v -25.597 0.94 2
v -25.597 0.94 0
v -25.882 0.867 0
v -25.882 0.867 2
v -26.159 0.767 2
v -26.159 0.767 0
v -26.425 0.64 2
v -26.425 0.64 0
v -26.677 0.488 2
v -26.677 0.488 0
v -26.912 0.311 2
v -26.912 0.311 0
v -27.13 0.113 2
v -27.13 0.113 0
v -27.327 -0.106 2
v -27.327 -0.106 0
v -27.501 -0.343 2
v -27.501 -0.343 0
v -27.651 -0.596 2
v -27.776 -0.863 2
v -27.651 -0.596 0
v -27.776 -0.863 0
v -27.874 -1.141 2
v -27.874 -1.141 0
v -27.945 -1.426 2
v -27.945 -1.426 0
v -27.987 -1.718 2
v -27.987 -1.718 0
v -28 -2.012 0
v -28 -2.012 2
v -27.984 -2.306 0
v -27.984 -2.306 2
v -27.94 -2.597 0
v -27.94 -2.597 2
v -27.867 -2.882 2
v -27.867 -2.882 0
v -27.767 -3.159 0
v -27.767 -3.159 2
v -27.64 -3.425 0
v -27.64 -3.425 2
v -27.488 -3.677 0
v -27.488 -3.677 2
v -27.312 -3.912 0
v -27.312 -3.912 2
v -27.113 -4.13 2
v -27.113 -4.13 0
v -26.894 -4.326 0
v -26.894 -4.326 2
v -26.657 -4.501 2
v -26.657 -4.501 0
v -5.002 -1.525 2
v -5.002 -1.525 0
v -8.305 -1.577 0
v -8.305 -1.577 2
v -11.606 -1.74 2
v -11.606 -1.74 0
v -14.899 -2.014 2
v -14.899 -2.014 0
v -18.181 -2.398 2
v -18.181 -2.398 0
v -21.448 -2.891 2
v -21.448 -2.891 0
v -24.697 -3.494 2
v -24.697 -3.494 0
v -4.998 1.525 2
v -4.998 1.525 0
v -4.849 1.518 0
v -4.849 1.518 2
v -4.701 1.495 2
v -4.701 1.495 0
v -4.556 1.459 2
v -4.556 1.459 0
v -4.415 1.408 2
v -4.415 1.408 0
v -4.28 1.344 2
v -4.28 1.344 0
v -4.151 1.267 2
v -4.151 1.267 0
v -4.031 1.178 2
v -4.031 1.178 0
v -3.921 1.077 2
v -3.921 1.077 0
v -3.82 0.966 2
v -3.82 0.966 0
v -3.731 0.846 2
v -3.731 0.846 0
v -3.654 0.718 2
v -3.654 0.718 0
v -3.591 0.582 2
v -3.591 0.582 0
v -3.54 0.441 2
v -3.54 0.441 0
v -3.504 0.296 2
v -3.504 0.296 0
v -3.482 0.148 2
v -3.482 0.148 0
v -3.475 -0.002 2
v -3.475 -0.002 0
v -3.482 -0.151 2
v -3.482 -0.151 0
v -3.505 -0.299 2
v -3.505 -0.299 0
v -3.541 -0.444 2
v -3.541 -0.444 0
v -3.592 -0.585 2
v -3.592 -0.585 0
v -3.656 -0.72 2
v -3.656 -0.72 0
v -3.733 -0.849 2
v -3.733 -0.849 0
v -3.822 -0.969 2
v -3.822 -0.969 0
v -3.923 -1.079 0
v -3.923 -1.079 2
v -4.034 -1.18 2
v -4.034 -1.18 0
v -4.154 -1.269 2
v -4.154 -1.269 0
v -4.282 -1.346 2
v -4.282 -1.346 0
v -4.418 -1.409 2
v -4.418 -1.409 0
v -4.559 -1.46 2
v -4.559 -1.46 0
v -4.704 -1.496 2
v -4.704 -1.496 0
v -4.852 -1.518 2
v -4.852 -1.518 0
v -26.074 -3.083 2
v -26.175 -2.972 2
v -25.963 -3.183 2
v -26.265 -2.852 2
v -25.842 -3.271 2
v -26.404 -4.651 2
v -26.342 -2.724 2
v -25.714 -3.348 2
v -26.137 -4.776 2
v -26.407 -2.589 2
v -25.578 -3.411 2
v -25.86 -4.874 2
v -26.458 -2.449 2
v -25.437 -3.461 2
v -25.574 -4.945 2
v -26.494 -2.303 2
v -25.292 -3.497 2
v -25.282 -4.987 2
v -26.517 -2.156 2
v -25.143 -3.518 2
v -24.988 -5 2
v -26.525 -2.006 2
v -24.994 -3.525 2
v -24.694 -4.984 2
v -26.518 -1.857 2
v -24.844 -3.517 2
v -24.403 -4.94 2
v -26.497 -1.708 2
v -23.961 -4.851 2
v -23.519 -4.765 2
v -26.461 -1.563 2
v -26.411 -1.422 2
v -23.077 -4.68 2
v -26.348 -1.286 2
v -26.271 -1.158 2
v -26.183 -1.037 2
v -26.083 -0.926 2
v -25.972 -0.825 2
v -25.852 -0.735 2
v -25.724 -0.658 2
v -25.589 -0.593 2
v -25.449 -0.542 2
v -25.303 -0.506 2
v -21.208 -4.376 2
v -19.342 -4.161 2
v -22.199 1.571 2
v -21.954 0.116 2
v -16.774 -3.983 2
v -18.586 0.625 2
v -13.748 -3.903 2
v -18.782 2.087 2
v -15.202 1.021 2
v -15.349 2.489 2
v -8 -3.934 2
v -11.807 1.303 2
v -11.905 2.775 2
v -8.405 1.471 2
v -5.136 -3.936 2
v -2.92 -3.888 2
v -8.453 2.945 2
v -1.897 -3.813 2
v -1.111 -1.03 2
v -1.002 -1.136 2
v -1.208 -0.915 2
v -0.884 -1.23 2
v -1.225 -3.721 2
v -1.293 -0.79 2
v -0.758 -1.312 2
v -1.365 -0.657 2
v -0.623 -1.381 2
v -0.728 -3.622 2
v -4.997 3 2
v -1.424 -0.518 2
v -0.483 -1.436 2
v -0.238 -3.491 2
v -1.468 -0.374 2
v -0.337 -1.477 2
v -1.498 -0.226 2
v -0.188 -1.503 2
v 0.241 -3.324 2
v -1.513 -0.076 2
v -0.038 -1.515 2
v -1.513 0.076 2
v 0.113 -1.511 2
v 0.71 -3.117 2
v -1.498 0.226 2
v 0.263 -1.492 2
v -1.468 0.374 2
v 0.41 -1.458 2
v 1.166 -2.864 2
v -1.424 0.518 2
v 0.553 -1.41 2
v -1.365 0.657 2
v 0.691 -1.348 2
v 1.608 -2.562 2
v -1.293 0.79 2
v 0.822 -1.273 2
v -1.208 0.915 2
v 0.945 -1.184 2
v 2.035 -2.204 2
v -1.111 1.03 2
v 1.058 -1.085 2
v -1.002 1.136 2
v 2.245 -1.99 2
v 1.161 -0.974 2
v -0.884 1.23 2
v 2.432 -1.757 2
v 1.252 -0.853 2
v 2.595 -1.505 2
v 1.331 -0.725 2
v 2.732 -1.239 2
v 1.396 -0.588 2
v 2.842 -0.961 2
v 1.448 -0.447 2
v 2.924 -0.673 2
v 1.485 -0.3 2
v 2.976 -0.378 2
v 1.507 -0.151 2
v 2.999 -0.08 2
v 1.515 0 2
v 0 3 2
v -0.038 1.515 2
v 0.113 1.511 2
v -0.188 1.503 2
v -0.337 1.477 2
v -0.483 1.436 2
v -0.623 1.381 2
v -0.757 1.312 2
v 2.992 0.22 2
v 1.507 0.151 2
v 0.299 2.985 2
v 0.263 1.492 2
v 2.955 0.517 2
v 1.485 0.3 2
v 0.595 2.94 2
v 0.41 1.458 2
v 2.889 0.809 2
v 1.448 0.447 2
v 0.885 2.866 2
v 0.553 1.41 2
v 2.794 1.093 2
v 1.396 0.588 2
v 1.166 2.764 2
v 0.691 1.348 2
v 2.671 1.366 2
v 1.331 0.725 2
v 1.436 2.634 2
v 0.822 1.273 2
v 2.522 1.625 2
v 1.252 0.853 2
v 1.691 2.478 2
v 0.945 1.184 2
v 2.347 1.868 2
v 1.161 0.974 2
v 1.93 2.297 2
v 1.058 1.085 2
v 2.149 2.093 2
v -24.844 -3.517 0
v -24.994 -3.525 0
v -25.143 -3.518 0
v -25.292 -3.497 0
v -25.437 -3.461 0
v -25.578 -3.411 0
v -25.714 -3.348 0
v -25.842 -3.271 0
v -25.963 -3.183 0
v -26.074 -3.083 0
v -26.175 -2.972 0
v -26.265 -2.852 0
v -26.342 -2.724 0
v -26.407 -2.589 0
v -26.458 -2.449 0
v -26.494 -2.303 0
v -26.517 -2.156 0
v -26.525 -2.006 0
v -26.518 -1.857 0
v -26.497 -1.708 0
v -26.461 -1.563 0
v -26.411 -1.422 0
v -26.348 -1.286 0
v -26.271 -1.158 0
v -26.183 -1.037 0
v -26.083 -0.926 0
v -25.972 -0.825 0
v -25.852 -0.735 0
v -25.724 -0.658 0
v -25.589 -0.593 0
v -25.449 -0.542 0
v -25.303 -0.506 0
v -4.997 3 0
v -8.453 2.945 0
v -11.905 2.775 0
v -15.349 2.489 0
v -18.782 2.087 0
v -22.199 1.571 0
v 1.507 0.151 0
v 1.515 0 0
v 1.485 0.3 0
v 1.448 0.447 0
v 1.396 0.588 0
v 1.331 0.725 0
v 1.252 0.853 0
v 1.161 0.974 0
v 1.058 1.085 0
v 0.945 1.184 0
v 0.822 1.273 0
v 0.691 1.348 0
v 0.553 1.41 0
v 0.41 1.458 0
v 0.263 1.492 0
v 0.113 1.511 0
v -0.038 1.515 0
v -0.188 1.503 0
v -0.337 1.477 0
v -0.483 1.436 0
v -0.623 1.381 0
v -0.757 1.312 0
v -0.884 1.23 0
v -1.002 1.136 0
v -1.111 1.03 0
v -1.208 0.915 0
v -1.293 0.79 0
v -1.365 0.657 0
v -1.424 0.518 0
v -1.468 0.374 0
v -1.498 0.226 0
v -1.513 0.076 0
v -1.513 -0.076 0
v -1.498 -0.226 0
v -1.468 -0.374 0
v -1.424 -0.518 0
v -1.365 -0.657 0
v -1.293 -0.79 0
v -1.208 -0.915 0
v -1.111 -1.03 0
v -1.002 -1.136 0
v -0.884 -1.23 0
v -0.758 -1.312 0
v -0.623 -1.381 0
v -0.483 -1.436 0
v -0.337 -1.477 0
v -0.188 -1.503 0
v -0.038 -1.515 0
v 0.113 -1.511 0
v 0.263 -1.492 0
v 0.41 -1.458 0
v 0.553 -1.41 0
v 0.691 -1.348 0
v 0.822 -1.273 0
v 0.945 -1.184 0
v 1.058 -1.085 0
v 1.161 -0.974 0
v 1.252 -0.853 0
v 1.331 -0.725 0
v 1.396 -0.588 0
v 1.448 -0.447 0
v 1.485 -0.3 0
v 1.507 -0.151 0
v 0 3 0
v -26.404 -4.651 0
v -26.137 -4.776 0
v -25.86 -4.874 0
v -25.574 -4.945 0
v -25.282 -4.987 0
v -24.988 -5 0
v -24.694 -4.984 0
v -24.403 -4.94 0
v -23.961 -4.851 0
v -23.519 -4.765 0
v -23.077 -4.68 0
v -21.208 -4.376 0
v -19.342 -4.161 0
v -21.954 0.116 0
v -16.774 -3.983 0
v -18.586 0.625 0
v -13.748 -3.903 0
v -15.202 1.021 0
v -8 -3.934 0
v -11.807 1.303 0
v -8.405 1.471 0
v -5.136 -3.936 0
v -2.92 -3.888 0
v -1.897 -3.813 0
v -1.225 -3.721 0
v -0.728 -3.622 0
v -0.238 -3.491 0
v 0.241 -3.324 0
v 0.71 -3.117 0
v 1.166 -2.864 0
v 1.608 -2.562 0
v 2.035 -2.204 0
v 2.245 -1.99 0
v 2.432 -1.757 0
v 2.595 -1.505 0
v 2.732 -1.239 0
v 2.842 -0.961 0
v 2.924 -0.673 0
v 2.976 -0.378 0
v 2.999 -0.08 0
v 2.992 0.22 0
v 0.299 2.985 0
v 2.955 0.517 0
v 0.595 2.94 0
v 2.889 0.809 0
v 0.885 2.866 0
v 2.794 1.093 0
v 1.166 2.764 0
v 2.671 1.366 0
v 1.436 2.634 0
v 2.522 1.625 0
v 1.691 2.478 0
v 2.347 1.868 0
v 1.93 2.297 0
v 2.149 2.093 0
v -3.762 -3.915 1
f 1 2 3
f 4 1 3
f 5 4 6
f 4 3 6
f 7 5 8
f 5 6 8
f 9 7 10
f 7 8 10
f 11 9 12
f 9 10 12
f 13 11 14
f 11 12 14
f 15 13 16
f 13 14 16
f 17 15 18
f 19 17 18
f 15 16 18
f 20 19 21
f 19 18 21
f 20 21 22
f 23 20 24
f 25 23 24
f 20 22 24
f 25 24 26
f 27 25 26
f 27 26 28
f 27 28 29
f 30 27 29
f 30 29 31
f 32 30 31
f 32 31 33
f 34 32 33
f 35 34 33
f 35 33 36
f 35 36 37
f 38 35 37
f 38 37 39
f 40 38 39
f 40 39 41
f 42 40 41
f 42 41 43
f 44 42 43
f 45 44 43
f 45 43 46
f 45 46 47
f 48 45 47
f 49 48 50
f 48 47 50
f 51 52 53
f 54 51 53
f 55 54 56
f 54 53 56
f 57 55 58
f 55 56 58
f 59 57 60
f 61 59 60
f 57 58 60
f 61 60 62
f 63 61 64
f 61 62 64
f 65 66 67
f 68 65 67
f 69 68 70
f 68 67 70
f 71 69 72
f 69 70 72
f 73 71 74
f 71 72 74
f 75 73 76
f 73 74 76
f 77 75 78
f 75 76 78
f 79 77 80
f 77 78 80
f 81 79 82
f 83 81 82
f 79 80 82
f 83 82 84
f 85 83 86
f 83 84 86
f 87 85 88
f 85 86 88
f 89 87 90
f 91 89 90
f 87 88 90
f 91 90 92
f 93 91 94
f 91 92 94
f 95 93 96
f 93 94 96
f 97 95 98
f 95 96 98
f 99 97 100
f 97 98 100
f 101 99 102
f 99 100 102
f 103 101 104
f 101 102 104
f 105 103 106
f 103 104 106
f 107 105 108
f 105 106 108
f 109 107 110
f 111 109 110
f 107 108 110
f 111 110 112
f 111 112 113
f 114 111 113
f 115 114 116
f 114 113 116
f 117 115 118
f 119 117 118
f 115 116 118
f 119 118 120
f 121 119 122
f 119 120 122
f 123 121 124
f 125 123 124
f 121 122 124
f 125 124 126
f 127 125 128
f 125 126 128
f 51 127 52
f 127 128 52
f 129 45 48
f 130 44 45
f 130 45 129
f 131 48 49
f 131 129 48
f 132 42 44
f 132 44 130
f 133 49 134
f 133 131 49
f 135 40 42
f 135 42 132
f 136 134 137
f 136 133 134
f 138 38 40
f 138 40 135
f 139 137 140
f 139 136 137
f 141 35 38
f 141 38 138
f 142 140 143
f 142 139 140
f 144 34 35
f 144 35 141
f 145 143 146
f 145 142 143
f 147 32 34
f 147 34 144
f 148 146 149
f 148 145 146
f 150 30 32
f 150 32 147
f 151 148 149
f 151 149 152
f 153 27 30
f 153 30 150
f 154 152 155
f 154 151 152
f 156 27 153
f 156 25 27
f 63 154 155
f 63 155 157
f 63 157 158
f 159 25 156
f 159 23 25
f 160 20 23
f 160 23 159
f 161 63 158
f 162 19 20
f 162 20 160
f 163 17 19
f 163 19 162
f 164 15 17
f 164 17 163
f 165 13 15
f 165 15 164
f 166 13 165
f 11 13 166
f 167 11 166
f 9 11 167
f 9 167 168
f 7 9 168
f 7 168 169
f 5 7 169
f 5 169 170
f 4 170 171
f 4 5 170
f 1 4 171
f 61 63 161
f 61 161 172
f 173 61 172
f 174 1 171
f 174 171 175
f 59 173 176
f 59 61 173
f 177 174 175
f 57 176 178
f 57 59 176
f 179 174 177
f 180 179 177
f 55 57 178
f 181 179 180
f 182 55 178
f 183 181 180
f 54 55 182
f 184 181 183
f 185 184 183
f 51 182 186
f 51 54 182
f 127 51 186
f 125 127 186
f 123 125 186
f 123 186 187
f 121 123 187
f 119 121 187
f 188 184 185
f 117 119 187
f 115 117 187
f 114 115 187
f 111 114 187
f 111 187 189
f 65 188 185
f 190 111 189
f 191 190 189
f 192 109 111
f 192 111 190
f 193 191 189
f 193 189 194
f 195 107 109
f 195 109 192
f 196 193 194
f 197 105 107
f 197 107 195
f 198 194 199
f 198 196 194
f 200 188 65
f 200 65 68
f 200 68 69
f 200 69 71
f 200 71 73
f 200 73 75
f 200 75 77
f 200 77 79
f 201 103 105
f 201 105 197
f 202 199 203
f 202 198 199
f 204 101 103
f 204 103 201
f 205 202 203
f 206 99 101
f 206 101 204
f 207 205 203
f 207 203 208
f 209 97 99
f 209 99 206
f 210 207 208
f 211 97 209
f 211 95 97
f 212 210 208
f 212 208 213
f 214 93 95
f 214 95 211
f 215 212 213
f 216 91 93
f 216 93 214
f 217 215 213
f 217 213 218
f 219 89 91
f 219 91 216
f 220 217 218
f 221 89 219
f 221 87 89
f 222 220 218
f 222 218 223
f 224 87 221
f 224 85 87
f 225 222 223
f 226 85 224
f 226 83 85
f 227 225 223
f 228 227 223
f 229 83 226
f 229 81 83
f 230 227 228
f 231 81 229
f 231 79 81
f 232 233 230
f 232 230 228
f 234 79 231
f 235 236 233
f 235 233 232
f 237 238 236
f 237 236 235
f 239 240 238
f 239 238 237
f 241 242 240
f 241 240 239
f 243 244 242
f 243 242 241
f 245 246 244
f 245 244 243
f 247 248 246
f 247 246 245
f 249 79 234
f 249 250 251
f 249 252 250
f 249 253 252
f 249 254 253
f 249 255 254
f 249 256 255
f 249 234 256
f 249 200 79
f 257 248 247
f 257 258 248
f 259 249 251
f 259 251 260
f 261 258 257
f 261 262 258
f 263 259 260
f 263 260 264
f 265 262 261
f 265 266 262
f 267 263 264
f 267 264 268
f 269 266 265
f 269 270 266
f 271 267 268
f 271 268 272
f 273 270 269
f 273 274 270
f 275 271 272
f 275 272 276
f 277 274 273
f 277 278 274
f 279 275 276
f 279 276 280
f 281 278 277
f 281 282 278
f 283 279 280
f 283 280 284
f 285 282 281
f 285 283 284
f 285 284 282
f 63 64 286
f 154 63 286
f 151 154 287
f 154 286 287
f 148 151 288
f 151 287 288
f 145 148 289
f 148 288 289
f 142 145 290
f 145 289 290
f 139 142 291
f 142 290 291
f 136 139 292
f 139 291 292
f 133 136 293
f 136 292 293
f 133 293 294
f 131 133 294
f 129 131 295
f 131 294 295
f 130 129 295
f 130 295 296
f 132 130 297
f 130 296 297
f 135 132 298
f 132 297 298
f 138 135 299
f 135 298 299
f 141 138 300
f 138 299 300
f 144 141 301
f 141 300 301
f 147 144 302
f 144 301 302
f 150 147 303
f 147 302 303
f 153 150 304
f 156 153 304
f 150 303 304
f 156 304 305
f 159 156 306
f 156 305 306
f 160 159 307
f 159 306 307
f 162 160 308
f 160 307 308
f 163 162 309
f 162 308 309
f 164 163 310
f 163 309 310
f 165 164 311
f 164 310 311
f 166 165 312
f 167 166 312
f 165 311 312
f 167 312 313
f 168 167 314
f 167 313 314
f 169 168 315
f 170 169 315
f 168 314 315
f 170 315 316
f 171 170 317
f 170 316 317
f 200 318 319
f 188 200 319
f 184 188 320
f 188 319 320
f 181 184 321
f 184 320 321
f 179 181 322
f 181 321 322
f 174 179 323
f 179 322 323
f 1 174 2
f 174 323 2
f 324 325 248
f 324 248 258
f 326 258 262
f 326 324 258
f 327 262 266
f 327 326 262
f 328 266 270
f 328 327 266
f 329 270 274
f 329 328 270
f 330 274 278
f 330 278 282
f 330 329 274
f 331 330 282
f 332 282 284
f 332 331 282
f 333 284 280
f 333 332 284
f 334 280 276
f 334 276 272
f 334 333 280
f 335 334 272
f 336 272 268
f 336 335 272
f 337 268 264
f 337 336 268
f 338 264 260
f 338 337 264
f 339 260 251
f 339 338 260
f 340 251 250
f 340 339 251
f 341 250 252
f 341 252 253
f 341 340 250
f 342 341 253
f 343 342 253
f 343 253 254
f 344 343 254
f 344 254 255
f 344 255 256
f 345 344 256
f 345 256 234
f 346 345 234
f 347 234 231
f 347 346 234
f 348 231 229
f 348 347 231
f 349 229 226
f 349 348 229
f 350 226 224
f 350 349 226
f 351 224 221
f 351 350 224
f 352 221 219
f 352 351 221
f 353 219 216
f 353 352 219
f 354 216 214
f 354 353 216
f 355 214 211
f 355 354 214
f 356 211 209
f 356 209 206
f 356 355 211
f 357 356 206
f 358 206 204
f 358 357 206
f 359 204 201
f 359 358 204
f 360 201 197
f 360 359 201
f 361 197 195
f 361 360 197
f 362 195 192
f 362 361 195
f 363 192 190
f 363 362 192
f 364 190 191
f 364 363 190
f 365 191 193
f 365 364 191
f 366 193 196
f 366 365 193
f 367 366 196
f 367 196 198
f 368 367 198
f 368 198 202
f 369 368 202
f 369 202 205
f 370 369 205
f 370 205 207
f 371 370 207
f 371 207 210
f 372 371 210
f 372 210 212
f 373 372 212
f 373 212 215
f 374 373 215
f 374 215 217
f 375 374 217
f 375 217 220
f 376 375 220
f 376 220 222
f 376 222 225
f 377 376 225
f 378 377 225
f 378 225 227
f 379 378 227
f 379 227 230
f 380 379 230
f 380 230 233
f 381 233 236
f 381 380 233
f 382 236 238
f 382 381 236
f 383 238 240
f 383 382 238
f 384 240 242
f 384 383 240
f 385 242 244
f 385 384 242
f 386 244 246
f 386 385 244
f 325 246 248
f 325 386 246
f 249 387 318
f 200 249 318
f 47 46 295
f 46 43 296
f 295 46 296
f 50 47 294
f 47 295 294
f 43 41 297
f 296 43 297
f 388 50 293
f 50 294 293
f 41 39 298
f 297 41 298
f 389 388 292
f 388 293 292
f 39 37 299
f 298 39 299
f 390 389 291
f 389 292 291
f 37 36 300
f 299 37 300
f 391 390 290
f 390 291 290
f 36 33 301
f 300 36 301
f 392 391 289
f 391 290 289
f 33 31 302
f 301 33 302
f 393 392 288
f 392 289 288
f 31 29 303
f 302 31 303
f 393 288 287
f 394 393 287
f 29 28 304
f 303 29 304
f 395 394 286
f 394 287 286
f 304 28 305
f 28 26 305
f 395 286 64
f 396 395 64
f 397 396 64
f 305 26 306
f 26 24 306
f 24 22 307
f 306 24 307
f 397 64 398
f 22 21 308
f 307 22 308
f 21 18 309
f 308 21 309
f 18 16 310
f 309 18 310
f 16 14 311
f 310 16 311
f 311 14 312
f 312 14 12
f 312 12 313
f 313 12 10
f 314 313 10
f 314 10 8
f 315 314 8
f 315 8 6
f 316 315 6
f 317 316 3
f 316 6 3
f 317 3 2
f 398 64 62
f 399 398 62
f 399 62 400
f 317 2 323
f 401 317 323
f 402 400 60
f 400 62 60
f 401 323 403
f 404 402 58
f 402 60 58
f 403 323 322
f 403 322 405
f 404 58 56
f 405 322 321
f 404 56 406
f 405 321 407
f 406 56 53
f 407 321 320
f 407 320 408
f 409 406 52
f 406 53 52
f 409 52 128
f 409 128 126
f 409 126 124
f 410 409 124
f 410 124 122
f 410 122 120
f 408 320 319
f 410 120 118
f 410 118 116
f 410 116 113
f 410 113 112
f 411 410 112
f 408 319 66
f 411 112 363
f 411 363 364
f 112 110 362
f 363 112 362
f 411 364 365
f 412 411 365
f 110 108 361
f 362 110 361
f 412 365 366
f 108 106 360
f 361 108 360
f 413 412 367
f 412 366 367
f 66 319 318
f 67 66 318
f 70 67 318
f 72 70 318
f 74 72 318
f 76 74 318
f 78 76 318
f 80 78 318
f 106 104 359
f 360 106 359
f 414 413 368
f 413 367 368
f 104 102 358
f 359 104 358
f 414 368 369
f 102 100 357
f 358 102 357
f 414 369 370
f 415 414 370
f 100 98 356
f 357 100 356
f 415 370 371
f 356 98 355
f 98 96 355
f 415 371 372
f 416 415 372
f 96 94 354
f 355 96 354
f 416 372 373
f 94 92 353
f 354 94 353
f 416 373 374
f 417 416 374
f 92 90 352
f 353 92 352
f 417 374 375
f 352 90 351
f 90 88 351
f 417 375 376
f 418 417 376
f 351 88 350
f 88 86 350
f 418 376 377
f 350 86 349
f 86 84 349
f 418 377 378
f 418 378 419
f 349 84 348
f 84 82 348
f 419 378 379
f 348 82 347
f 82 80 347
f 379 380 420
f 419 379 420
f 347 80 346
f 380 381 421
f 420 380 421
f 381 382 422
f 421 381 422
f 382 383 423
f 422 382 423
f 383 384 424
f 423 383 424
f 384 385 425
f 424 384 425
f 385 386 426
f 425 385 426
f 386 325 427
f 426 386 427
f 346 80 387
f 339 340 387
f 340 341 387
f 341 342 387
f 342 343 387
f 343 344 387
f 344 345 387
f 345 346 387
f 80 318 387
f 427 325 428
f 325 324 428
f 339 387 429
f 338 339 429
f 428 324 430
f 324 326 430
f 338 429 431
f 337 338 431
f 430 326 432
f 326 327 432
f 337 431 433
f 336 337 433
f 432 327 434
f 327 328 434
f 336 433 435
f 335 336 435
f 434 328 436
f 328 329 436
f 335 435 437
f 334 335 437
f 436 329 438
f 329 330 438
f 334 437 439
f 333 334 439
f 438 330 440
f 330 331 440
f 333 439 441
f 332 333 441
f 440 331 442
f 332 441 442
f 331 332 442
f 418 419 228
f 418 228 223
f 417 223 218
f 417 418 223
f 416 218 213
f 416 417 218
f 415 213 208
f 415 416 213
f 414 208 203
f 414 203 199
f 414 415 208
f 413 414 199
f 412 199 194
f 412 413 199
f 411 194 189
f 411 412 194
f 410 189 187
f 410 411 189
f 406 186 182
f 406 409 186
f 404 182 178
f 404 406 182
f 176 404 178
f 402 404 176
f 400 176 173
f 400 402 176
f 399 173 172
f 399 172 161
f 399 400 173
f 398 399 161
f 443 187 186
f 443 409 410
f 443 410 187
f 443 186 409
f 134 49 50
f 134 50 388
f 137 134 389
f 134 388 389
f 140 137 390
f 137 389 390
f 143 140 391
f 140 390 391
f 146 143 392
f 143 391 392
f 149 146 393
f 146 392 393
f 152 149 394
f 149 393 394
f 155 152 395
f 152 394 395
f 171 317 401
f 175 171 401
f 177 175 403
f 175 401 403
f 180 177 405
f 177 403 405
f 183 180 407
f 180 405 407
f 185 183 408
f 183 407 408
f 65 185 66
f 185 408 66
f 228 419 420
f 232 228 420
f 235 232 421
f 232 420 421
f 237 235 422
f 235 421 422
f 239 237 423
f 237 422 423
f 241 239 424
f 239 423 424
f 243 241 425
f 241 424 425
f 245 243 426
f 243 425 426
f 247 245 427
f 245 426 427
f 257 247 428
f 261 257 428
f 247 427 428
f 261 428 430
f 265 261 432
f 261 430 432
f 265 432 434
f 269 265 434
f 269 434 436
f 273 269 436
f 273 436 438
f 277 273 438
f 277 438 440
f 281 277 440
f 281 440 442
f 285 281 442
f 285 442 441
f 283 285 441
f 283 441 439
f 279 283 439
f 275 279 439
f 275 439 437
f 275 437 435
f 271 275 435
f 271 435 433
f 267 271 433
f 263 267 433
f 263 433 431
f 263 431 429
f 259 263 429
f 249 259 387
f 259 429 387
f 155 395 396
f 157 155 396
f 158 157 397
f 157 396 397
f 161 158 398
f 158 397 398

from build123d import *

# Parameters (mm, degrees)
SKETCH_2_R          = 1.515
EXTRUDE_2_DEPTH     = 2
EXTRUDE_START       = -2
EXTRUDE_3_OUTLINE_R = 1.515
EXTRUDE_3_DEPTH     = 2


with BuildPart() as part:
    # 草图2 → 凸台-拉伸2 (new body)
    with BuildSketch(Plane.XY):
        with BuildLine():
            Line((-4.501e-06, 3), (-4.996999856, 2.999992503))
            ThreePointArc((-4.996999856, 2.999992503), (-15.348887441, 2.488874451), (-25.596998621, 0.939992446))
            ThreePointArc((-25.596998621, 0.939992446), (-27.93999256, -2.596998062), (-24.403001606, -4.939991329))
            ThreePointArc((-24.403001606, -4.939991329), (-14.75186649, -3.481335038), (-5.003000142, -2.999990956))
            ThreePointArc((-5.003000143, -2.999991003), (-5.001500071, -2.999992128), (-5, -2.999994003))
            Line((-5, -2.999994003), (-3.598e-06, -3))
            ThreePointArc((-3.598e-06, -3), (3, 4.51e-07), (-4.501e-06, 3))
        make_face()
        Circle(SKETCH_2_R, mode=Mode.SUBTRACT)
        with BuildLine():
            ThreePointArc((-4.998474924, 1.524999237), (-3.475000763, -0.001525076), (-5.001525076, -1.524999237))
            ThreePointArc((-5.001525076, -1.524999237), (-14.898633731, -2.013662689), (-24.696525076, -3.494499237))
            ThreePointArc((-24.696525076, -3.494499237), (-26.494499237, -2.303474924), (-25.303474924, -0.505500763))
            ThreePointArc((-25.303474924, -0.505500763), (-15.202120074, 1.021200741), (-4.998474924, 1.524999237))
        make_face(mode=Mode.SUBTRACT)
    extrude(amount=EXTRUDE_2_DEPTH)

    # 凸台-拉伸3: read off the stored shape, not the designer's step
    # 凸台-拉伸3 outline → 凸台-拉伸3 (add)
    with BuildSketch(Plane.XY.offset(2).offset(EXTRUDE_START)):
        with BuildLine():
            ThreePointArc((-25.596998507, 0.939991888), (-27.939991888, -2.596998507), (-24.403001493, -4.939991888))
            ThreePointArc((-24.403001493, -4.939991888), (-23.740335049, -4.807830903), (-23.076763905, -4.680290004))
            add(Edge.make_bspline(
                [(2.0353099, -2.203976772), (0.364621675, -3.746809857), (-8.353685573, -4.252255019), (-16.667064883, -3.471457034), (-23.076763905, -4.680290004)],
                knots=[0, 0, 0, 0, 0.237995806, 1, 1, 1, 1], degree=3))
            ThreePointArc((2.0353099, -2.203976772), (2.79391492, 1.092721109), (-4.501e-06, 3))
            Line((-4.501e-06, 3), (-4.996999856, 2.999992413))
            ThreePointArc((-4.996999856, 2.999992413), (-15.348887454, 2.48887454), (-25.596998507, 0.939991888))
        make_face()
        with BuildLine():
            ThreePointArc((-24.696525076, -3.494499237), (-26.494499237, -2.303474924), (-25.303474924, -0.505500763))
            ThreePointArc((-25.303474924, -0.505500763), (-15.202120074, 1.021200741), (-4.998474924, 1.524999237))
            ThreePointArc((-4.998474924, 1.524999237), (-3.475000763, -0.001525076), (-5.001525076, -1.524999237))
            ThreePointArc((-5.001525076, -1.524999237), (-14.898633731, -2.013662689), (-24.696525076, -3.494499237))
        make_face(mode=Mode.SUBTRACT)
        Circle(EXTRUDE_3_OUTLINE_R, mode=Mode.SUBTRACT)
    extrude(amount=EXTRUDE_3_DEPTH)


solid = part.part
